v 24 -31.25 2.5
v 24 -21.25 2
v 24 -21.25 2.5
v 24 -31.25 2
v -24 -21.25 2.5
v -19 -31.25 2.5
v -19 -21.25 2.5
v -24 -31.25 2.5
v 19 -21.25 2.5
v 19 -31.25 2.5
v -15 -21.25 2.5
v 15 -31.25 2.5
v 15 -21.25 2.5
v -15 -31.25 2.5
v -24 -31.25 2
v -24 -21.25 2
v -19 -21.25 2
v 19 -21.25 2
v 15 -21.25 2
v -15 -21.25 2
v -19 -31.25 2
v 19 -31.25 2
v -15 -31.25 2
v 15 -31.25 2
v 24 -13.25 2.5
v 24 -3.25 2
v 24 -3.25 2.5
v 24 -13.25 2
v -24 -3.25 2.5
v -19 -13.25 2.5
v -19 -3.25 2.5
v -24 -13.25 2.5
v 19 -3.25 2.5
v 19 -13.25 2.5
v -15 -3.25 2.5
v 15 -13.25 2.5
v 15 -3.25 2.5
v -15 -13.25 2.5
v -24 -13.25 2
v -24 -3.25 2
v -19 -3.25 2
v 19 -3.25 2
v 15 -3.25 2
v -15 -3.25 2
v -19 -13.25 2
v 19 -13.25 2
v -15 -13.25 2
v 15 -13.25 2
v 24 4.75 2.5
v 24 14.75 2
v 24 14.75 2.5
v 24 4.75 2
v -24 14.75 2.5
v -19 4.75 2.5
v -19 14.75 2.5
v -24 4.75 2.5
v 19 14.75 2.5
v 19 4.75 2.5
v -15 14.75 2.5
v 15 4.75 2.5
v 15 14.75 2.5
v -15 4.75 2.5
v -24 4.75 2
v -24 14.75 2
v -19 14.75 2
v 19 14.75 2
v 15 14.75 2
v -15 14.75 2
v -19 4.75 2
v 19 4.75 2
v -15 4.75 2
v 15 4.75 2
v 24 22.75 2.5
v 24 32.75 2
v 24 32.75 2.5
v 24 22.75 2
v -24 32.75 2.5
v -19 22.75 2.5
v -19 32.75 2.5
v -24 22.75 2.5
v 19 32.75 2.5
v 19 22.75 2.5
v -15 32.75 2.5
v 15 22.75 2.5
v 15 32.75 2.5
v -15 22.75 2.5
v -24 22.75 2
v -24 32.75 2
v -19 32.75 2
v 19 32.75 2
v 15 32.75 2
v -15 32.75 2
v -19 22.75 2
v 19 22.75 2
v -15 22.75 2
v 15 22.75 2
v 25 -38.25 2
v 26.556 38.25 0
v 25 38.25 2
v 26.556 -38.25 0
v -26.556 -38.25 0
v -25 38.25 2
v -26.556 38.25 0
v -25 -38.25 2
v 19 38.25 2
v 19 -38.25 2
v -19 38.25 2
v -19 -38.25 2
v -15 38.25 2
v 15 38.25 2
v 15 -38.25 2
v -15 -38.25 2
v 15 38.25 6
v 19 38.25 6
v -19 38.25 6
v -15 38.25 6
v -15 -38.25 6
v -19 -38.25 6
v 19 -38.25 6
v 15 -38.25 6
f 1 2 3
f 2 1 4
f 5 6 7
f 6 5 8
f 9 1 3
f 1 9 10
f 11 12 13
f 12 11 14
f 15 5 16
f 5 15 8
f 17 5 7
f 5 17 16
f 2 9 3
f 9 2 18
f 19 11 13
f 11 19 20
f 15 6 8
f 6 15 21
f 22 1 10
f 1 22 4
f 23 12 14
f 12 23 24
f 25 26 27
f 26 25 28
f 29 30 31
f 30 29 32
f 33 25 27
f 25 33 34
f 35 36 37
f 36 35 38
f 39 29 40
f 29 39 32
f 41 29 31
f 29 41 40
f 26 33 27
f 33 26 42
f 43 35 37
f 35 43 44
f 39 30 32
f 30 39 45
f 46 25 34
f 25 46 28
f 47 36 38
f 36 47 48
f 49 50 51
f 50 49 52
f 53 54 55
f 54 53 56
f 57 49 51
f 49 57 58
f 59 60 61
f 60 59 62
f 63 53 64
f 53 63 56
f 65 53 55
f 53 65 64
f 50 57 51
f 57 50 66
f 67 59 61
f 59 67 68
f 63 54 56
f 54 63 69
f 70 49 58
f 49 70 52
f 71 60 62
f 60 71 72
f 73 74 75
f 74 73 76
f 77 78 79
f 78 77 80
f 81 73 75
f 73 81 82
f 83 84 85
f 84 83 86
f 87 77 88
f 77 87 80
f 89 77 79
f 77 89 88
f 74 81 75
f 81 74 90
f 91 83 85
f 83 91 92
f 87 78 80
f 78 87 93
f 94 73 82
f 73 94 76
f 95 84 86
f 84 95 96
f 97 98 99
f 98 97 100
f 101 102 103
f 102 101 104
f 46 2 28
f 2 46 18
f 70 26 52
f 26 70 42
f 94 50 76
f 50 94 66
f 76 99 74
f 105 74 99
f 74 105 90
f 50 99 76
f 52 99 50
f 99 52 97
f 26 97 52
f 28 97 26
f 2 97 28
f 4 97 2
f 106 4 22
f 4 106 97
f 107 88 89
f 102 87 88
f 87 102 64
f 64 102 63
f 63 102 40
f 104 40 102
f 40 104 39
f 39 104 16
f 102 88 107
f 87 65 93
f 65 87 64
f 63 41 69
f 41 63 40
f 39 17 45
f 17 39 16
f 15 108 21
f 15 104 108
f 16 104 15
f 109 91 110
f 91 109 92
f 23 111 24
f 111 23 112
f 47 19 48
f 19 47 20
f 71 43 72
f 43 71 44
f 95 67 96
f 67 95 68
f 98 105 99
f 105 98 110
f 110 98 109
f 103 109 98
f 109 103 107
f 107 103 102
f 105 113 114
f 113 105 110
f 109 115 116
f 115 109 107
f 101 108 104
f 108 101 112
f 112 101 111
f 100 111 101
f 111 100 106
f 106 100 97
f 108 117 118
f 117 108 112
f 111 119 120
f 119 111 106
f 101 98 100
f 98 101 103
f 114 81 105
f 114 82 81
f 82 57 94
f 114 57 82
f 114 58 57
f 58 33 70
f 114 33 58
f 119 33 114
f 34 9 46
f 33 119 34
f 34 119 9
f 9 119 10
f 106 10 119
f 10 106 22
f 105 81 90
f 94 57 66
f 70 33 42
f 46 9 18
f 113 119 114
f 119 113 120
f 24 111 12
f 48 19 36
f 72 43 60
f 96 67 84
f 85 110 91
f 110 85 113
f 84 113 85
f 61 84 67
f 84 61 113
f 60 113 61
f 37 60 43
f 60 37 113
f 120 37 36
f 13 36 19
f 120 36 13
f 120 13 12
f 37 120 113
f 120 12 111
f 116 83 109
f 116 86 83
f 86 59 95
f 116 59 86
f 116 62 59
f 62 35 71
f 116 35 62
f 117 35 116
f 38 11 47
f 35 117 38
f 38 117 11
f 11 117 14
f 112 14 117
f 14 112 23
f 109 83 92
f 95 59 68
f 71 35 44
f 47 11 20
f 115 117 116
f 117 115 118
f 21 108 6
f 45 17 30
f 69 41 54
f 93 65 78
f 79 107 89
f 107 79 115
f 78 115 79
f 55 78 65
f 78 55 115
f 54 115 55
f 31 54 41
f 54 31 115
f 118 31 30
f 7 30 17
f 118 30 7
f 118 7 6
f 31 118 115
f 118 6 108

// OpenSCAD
//
// Short track, made to be compatible with Geotrax®
// (Work in progress : no join system between tracks)
// Author: Francois Crevola (francois@crevola.org)
//

// Try d = 0 for more Geotraxed version
// Try d = -7 for simplified version (more 3D-printer friendly)
d = -7;

intersection() {
	translate([0,0,d]) shortTrack();
	translate([0,0,10]) cube(size=[150,150,20], center=true);
}

module shortTrack() {

	long = 76.5;

	// main piece
		rotate([90,0,0])
		translate([0, 0, -long/2]) // center
		linear_extrude(height=long)
			polygon(points=[[0,7],[-25,7],[-30,0],[-32,0],[-25,9],[-19,9],[-19,13],[-15,13],[-15,9],[15,9],[15,13],[19,13],[19,9],[25,9],[32,0],[30,0],[25,7]], paths=[[0,1,2,3,4,5,6,7,8,9,10,11,12,13,14,15,16,17,18,19,20]]);


	// + traverses
	spacing = 18;
	max = 4;
	delta = 6;
	for (i = [1:max]) // n iterations
	{
		translate([0,-long/2+(i*spacing)-delta,9])
		cube(size = [48, 10, 1], center = true);
	}

	// + supports
	for (i = [-1, 0, 1]) {
		translate([0,i*(long/3),0])
		rotate([90,0,0])
		linear_extrude(height=2.5)
			polygon(points=[[-32,0],[-25,9],[25,9],[32,0]], paths=[[0,1,2,3,4,5,6,7,8,9,10,11,12,13,14,15,16,17,18,19,20]]);
	}

}
